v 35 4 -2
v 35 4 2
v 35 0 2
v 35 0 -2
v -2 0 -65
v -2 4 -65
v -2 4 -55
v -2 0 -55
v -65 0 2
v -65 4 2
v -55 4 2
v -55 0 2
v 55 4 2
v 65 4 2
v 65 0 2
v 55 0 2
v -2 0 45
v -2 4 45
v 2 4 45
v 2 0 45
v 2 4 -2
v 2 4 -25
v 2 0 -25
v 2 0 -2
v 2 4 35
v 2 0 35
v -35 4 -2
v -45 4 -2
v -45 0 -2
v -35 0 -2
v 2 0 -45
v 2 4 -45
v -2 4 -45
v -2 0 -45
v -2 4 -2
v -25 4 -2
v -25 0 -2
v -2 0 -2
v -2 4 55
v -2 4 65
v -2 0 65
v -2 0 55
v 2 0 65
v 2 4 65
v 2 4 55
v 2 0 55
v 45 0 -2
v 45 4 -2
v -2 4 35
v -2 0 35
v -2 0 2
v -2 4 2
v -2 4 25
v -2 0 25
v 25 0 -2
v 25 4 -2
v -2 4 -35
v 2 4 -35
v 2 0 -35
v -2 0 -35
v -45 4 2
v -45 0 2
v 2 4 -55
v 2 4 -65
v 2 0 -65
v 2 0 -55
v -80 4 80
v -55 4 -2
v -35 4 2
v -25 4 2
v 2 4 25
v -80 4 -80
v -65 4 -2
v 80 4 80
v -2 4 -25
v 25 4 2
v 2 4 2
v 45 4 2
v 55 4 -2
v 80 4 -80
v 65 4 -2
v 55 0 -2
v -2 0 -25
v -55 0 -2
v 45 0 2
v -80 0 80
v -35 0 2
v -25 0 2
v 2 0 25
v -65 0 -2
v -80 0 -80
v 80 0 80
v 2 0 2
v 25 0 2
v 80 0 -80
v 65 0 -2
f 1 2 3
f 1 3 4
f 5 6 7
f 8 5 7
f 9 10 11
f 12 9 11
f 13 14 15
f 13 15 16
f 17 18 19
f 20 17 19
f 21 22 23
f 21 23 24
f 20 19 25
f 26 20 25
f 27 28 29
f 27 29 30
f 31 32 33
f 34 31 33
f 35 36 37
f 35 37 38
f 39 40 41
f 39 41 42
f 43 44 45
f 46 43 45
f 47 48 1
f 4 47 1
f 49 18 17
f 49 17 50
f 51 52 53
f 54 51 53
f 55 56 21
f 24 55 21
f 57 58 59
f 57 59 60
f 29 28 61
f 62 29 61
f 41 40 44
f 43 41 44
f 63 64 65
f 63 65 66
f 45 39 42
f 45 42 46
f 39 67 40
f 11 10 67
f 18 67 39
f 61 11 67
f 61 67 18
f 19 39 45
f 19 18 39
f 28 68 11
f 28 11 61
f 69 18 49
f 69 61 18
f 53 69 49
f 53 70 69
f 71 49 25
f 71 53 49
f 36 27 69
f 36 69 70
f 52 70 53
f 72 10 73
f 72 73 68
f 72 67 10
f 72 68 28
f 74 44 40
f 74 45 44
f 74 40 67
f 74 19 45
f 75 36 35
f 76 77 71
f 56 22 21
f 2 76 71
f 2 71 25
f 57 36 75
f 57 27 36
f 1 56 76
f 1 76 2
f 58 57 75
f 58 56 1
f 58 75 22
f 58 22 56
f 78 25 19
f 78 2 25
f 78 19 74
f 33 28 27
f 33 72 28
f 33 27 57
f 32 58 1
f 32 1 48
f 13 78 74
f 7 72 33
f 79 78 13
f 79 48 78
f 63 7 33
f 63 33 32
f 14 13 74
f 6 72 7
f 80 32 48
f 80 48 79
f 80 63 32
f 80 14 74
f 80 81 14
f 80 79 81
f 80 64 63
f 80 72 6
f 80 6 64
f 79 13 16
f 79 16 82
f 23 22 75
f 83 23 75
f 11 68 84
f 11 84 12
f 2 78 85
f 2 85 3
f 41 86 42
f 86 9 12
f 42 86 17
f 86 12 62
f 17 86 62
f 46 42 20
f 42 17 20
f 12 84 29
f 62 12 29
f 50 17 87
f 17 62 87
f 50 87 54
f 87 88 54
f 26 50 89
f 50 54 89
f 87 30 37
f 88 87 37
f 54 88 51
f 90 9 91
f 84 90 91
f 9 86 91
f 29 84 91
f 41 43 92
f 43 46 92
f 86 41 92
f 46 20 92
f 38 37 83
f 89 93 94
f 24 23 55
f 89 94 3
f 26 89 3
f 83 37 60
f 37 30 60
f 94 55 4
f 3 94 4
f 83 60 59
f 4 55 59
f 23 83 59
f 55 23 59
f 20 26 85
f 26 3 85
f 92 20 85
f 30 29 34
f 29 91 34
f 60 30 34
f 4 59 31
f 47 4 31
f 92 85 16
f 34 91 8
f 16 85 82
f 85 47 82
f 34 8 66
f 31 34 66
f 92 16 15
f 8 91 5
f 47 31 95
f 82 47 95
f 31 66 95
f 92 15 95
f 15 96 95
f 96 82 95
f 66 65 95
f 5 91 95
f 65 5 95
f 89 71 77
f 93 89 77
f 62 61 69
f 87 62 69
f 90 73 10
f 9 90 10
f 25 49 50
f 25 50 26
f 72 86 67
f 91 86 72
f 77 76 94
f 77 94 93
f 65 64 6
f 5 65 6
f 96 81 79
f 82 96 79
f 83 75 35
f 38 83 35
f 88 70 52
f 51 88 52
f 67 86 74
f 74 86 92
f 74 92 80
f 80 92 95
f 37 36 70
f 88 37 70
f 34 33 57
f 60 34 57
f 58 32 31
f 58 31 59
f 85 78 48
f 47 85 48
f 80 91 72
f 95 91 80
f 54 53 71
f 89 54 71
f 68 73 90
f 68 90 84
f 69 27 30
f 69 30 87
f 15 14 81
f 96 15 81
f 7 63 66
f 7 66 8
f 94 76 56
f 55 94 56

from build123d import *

# Parameters (mm, degrees)
SKETCH1_W           = 160
SKETCH1_H           = 160
BOSS_EXTRUDE1_DEPTH = 4
SKETCH2_W           = 4
SKETCH2_H           = 25
SKETCH2_H_2         = 10
CUT_EXTRUDE1_DEPTH  = 5
CIRPATTERN1_COUNT   = 4


with BuildPart() as part:
    # Sketch1 → Boss-Extrude1 (new body)
    with BuildSketch(Plane(origin=(0, 0, 0), x_dir=(1, 0, 0), z_dir=(0, 1, 0))):
        Rectangle(SKETCH1_W, SKETCH1_H)
    extrude(amount=BOSS_EXTRUDE1_DEPTH)

    # Sketch2 → Cut-Extrude1 (cut, through all)
    with BuildSketch(Plane(origin=(0, 4, 0), x_dir=(1, 0, 0), z_dir=(0, 1, 0))):
        with Locations((0, -12.5)):
            Rectangle(SKETCH2_W, SKETCH2_H)
        with Locations((0, -40)):
            Rectangle(SKETCH2_W, SKETCH2_H_2)
        with Locations((0, -60)):
            Rectangle(SKETCH2_W, SKETCH2_H_2)
    cut_extrude1 = extrude(amount=-CUT_EXTRUDE1_DEPTH, mode=Mode.SUBTRACT)

    # CirPattern1: Cut-Extrude1 ×4 about axis
    cirpattern1_axis = Axis((0, 0, 0), (0, 1, 0))
    for i in range(1, CIRPATTERN1_COUNT):
        add(cut_extrude1.rotate(cirpattern1_axis, i * 360 / CIRPATTERN1_COUNT), mode=Mode.SUBTRACT)


solid = part.part
